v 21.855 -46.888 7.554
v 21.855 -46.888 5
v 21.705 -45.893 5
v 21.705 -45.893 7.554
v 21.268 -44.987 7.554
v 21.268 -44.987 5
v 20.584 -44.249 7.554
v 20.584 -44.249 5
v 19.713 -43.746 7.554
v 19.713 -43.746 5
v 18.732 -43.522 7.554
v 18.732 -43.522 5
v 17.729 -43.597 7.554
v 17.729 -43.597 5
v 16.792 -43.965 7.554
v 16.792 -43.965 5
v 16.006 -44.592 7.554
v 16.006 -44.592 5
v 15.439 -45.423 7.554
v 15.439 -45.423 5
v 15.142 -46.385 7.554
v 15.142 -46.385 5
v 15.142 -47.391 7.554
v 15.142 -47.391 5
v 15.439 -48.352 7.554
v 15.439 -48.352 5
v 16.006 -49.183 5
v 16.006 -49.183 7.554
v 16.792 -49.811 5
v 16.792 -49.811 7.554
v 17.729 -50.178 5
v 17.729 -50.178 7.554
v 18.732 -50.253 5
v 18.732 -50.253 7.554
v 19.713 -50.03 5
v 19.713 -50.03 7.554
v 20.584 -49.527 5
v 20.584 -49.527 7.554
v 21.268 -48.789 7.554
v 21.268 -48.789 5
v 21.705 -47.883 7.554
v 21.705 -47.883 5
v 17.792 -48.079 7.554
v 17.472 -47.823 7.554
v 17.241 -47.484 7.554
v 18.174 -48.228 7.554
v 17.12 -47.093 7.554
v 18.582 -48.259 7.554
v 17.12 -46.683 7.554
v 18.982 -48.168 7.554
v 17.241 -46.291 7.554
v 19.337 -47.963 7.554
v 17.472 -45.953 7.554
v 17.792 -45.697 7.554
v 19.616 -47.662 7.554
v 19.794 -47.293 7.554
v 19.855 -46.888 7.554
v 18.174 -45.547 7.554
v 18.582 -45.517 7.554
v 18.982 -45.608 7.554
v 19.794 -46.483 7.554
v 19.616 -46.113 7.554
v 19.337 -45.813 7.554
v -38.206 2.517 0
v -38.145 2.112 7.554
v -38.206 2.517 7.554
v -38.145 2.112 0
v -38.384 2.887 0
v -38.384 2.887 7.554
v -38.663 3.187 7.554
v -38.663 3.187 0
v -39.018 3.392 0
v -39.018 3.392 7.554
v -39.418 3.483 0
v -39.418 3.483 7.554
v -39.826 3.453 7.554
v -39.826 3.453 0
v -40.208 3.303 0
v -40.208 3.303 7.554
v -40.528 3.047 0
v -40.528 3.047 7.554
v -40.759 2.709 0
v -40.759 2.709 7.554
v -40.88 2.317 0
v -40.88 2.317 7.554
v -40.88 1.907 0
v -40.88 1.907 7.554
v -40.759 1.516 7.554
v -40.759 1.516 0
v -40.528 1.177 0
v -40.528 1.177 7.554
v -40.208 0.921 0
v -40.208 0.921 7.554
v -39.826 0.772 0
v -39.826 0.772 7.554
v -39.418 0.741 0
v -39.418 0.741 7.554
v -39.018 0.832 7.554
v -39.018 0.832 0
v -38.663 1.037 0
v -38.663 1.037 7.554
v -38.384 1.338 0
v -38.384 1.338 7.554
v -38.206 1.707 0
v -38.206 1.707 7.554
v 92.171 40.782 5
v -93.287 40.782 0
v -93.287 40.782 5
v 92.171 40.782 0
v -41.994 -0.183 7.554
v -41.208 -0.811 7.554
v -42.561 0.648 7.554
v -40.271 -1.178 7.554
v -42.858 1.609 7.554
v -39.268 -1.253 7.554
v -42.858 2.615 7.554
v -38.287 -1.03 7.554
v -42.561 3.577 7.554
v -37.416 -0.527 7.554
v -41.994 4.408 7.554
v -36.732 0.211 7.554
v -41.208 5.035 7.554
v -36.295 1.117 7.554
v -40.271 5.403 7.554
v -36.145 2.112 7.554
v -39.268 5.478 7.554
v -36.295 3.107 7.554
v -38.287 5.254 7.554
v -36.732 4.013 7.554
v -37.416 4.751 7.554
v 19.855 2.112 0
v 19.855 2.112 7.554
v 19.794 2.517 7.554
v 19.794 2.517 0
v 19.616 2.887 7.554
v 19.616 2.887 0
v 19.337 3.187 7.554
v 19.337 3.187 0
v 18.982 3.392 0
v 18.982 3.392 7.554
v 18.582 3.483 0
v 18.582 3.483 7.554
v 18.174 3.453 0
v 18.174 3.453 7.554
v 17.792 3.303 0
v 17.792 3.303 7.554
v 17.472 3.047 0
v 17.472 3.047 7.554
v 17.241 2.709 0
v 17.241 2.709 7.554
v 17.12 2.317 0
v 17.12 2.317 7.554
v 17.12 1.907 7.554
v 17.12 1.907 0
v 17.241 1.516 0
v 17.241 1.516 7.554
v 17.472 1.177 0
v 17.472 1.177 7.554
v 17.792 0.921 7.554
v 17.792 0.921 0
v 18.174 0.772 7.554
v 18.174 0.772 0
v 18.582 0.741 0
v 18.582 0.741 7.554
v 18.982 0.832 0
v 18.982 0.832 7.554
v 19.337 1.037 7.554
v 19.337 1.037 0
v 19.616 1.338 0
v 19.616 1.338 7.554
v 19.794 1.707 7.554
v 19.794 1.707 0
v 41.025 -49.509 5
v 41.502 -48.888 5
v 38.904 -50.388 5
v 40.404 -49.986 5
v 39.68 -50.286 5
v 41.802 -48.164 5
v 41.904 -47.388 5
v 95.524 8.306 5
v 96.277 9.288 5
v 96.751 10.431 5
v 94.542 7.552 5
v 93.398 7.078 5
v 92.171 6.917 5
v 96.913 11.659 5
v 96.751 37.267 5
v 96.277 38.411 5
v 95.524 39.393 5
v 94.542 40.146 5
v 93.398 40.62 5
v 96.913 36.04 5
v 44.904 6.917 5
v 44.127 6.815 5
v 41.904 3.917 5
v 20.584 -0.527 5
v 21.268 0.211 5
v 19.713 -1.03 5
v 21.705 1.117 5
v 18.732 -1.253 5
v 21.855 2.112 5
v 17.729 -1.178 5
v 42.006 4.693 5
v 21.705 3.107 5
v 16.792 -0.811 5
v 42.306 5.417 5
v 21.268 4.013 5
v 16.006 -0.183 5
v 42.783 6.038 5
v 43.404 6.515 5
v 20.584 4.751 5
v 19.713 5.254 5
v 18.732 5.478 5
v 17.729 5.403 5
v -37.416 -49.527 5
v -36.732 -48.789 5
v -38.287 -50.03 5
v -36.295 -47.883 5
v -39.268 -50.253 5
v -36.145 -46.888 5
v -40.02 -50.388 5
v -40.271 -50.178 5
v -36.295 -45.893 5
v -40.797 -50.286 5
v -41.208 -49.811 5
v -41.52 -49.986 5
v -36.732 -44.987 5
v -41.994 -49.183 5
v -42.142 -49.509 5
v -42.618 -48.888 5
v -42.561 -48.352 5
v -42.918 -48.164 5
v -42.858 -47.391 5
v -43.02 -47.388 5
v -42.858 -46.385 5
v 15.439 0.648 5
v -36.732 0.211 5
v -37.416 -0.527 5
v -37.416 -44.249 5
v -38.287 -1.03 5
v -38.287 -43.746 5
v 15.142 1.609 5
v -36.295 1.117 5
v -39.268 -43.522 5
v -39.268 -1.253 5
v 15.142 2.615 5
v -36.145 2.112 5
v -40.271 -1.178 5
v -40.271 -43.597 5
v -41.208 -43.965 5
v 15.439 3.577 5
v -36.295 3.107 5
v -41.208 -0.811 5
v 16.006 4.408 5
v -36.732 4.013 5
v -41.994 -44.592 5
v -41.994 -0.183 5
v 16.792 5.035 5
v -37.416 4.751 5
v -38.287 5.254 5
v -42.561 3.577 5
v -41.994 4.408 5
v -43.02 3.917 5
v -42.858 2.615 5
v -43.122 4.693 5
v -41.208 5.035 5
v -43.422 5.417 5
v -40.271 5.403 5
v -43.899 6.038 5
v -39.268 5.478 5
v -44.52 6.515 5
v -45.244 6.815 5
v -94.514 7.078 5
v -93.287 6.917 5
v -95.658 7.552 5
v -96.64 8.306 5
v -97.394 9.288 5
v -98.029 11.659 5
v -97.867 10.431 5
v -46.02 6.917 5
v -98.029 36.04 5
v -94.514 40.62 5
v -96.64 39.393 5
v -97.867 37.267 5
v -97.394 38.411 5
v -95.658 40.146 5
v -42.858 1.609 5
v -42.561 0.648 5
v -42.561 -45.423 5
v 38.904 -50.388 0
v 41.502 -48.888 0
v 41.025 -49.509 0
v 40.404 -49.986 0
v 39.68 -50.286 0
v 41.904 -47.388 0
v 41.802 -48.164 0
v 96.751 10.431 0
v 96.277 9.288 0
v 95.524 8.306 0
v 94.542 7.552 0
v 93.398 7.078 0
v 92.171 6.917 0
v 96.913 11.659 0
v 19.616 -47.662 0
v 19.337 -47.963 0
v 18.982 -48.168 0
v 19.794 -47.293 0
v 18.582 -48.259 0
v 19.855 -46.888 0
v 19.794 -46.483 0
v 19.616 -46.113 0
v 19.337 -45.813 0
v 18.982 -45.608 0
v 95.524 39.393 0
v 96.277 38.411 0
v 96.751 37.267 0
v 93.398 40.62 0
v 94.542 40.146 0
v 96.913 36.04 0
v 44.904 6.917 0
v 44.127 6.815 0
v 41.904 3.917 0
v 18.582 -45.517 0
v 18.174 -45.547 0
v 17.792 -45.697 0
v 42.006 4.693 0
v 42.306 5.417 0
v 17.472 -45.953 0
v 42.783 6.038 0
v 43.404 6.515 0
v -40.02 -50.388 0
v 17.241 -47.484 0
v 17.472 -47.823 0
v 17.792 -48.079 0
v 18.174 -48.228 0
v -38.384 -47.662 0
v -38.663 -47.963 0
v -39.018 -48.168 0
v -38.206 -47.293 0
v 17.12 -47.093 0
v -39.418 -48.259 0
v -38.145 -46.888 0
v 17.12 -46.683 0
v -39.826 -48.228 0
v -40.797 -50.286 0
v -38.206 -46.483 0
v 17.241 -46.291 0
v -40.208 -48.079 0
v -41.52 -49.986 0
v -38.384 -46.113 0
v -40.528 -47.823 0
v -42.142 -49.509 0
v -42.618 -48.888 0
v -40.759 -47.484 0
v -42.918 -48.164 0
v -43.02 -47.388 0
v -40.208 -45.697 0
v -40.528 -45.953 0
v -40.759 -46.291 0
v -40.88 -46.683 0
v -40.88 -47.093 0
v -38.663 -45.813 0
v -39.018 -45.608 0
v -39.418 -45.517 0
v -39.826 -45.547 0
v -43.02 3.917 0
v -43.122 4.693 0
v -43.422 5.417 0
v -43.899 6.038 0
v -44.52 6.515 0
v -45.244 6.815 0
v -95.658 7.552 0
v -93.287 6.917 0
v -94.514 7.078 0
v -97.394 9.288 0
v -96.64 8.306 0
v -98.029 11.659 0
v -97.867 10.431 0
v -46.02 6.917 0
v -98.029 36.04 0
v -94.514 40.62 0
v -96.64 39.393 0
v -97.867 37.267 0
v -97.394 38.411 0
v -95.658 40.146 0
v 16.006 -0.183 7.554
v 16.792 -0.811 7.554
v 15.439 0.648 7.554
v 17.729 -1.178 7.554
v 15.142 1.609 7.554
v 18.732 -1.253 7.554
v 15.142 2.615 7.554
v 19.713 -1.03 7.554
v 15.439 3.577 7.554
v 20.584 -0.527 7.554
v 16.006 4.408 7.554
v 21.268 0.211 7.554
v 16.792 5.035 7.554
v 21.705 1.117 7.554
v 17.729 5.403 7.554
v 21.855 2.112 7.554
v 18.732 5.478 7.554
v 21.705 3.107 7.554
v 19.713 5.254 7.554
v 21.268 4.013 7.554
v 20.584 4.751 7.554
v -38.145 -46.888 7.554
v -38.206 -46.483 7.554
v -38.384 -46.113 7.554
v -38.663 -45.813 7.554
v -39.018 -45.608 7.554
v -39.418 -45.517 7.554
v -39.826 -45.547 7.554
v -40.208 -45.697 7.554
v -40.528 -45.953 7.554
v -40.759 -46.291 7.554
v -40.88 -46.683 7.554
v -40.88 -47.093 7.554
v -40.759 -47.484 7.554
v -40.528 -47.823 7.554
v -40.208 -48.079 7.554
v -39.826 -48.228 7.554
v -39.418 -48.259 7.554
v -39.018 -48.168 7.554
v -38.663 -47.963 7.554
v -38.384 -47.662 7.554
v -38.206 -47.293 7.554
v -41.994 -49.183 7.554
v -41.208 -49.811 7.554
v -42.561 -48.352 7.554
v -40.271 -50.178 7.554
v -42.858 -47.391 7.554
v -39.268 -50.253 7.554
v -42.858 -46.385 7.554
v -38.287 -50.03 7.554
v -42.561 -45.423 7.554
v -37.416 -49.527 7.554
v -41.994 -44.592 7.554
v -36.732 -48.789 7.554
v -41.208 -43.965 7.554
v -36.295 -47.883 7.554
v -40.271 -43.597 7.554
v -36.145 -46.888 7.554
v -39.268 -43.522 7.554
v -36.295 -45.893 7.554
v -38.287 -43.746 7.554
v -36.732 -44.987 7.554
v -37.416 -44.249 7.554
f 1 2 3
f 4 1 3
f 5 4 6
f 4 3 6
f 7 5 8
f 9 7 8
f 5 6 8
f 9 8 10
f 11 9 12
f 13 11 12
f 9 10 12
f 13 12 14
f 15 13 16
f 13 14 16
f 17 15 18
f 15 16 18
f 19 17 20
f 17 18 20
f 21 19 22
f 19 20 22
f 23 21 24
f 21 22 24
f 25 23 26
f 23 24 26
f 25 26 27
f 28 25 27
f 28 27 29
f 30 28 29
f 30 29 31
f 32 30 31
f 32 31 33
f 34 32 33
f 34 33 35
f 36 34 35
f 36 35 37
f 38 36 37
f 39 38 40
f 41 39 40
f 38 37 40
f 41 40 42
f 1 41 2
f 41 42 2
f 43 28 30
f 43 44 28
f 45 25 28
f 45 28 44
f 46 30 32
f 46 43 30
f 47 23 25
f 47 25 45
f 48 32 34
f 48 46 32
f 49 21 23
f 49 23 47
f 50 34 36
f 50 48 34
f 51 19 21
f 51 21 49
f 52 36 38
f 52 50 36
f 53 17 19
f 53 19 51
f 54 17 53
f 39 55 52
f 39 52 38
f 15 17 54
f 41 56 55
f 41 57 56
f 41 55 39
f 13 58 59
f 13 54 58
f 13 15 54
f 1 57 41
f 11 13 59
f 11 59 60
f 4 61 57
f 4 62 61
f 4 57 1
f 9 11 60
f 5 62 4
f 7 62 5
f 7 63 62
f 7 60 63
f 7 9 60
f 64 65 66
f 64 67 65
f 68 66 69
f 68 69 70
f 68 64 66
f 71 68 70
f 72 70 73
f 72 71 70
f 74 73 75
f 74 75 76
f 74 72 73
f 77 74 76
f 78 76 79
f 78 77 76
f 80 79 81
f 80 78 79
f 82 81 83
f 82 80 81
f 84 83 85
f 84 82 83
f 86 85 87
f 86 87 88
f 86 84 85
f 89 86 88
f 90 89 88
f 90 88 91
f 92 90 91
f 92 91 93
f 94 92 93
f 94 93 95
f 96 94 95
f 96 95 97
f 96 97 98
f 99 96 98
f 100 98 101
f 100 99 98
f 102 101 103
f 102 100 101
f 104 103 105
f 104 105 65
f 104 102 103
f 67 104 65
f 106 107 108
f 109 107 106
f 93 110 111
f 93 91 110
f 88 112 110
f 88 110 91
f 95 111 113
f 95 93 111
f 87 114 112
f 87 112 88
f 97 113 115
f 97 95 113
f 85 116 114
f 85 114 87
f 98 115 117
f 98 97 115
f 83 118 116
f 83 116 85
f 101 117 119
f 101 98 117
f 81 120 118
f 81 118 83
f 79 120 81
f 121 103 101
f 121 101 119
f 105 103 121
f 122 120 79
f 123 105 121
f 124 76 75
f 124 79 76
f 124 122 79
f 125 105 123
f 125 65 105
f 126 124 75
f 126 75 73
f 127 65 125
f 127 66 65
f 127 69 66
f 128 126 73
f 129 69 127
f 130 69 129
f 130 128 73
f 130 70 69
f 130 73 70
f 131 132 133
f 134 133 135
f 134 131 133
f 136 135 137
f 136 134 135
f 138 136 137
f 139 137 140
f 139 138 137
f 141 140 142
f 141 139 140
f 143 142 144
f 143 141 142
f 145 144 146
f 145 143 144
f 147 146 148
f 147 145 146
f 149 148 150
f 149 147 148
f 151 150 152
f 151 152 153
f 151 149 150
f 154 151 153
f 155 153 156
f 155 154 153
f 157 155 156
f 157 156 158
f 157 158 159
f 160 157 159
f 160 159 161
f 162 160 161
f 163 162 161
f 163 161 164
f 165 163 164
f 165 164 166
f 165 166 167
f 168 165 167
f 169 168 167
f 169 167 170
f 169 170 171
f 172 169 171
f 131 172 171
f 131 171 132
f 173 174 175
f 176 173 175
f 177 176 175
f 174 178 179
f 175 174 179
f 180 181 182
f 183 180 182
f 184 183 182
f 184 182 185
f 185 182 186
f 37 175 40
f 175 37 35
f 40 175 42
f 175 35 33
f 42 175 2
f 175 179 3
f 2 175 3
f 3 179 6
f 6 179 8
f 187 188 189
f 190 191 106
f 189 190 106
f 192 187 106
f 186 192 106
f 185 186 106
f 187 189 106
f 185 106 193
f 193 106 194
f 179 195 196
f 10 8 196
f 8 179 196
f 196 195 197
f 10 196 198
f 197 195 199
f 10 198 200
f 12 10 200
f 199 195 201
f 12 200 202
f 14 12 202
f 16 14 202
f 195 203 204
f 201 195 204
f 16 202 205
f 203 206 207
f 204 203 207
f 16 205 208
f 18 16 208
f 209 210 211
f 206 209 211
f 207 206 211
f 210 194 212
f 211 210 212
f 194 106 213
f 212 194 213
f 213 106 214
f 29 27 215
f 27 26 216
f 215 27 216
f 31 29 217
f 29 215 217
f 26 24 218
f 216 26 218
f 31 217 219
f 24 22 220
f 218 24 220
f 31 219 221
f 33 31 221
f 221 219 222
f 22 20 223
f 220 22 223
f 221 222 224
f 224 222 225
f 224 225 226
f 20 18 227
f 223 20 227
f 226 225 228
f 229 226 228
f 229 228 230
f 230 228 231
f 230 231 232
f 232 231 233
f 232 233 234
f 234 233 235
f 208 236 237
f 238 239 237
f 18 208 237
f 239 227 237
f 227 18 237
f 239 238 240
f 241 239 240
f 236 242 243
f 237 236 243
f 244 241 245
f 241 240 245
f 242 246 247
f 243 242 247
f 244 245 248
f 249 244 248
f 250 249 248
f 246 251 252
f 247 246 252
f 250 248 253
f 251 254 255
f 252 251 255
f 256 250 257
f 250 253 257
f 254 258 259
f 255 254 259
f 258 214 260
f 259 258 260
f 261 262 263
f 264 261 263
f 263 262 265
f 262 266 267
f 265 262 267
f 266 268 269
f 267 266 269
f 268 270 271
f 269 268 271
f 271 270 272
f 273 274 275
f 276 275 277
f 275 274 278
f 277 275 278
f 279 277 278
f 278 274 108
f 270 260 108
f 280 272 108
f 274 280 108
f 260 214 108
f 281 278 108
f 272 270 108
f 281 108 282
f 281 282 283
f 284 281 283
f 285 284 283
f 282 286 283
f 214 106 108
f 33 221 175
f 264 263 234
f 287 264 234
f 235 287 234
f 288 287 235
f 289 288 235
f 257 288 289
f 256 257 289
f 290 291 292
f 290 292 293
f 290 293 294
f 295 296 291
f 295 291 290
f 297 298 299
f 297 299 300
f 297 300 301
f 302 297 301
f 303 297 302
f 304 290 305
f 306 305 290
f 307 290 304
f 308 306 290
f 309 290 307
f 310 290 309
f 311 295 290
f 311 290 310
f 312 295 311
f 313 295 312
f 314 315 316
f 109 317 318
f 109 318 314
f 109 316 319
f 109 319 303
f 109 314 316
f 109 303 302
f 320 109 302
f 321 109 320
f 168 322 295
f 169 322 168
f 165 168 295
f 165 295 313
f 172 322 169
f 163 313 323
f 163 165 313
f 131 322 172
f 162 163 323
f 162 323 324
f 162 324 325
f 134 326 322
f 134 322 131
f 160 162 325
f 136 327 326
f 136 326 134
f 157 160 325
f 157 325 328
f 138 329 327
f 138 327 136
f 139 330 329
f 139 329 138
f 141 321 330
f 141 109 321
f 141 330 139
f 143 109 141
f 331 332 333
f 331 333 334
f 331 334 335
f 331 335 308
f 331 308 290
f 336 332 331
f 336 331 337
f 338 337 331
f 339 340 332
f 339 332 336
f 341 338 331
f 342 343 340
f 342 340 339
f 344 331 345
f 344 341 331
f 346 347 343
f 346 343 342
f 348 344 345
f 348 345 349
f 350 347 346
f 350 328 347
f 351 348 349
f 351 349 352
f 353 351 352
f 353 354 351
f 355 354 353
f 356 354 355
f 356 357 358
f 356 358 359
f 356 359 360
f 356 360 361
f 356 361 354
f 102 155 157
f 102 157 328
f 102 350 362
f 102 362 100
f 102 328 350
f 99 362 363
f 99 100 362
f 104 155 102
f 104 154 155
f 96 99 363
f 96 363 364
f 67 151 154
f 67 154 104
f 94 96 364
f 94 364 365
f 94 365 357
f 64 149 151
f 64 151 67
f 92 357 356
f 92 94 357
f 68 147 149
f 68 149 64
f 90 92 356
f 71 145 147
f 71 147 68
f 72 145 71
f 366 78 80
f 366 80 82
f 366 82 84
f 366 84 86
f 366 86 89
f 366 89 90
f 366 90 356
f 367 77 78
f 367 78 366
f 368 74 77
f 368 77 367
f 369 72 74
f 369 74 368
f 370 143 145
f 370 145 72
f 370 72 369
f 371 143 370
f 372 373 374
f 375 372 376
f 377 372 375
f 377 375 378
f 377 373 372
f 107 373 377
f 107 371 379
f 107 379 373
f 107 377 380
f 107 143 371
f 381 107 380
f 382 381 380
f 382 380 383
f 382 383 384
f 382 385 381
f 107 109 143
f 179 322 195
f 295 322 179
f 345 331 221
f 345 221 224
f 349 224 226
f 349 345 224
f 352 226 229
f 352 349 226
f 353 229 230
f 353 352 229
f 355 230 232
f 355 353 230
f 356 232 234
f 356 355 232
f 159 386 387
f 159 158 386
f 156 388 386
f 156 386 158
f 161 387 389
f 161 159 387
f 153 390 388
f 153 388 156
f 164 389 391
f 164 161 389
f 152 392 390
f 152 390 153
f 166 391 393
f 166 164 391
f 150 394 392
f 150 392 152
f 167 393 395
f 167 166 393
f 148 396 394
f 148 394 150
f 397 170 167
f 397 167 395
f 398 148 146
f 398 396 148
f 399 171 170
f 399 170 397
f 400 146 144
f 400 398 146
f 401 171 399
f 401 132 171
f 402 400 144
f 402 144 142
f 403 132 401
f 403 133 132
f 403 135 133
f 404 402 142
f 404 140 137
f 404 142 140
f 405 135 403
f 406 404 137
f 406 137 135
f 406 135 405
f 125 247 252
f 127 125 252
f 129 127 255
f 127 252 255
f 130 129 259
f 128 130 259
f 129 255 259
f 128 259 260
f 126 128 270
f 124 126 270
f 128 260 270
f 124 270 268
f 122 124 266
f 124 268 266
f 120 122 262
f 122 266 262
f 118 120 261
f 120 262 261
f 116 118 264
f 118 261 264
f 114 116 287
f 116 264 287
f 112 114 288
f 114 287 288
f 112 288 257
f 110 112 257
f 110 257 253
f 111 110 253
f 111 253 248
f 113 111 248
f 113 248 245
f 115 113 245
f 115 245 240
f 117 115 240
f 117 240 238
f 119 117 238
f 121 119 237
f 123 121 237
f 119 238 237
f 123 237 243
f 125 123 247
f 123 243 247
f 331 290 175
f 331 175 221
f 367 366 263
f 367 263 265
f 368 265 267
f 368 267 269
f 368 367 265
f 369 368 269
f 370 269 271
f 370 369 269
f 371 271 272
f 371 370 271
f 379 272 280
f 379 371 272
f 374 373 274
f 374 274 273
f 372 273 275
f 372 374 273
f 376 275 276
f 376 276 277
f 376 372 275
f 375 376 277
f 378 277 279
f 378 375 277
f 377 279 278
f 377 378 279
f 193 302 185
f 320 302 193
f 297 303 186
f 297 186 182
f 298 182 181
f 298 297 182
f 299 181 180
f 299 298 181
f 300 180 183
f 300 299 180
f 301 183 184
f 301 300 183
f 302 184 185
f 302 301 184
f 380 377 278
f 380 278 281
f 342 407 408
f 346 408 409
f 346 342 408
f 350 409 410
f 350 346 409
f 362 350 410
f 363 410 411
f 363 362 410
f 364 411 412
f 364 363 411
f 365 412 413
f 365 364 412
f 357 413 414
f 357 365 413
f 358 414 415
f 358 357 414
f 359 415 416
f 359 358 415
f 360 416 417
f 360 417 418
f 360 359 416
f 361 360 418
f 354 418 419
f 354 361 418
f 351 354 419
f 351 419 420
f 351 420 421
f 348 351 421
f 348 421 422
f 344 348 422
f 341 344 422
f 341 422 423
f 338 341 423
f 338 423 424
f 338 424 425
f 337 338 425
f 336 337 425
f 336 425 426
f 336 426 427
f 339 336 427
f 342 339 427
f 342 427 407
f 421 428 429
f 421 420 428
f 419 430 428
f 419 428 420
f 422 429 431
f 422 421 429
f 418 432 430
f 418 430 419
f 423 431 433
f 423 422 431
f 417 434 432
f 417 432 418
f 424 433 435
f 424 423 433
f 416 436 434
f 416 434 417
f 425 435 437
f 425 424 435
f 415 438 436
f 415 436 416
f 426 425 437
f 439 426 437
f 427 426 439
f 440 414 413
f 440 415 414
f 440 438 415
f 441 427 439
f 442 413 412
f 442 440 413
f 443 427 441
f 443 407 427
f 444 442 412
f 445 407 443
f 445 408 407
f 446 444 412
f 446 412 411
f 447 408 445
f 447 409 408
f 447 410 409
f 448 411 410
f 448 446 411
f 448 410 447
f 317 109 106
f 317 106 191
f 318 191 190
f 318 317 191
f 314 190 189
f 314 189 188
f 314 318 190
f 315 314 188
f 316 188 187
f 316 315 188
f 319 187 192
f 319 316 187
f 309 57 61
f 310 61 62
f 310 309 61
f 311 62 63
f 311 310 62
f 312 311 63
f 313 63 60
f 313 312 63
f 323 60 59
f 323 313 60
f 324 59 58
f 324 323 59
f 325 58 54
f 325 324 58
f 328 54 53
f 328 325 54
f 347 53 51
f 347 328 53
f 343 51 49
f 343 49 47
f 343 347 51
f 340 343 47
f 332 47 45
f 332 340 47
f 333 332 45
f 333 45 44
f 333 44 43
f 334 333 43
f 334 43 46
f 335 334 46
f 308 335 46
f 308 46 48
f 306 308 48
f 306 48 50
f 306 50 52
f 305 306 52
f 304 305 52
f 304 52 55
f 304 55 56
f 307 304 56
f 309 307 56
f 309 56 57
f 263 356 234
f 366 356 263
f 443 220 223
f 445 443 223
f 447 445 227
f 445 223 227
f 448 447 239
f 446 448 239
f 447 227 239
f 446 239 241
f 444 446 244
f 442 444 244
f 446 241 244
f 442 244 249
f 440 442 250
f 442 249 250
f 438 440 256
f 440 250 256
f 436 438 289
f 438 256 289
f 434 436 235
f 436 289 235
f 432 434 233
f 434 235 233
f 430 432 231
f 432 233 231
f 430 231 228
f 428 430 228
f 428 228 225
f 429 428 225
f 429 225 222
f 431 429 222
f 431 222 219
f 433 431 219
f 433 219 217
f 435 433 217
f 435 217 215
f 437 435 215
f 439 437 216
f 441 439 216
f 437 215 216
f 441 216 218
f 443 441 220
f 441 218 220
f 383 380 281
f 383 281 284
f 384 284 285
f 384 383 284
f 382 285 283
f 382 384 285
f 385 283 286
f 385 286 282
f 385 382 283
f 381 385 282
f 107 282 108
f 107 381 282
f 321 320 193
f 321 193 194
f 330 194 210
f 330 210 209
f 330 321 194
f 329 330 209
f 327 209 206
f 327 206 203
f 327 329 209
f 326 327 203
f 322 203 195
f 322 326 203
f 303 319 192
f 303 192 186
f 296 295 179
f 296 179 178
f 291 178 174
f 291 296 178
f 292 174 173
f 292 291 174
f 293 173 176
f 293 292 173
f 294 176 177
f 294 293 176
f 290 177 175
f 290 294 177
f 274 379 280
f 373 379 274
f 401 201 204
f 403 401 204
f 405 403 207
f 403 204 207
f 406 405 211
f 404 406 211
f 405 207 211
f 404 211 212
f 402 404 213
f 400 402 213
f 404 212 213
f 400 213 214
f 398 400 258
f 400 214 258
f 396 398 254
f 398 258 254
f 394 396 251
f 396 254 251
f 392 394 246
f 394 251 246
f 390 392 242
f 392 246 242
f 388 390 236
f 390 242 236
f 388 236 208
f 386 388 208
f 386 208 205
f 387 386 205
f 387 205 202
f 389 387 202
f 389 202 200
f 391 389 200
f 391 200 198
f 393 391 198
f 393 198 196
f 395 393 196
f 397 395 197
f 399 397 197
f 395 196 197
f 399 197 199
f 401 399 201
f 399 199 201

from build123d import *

# Parameters (mm, degrees)
GRUNDFORM_R                     = 1.375
AUFSATZ_LINEAR_AUSTRAGEN1_DEPTH = 5
SKIZZE2_R                       = 3.375
SKIZZE2_R_2                     = 1.375
AUFSATZ_LINEAR_AUSTRAGEN2_DEPTH = 2.554396


with BuildPart() as part:
    # Grundform → Aufsatz-Linear austragen1 (new body)
    with BuildSketch(Plane.XY):
        with BuildLine():
            Line((-93.287044917, 40.781629135), (92.170661923, 40.781629135))
            ThreePointArc((92.170661923, 40.781629135), (95.523773437, 39.39272487), (96.912677703, 36.039613355))
            Line((96.912677703, 36.039613355), (96.912677703, 11.658797868))
            ThreePointArc((96.912677703, 11.658797868), (95.523773437, 8.305686353), (92.170661923, 6.916782087))
            Line((92.170661923, 6.916782087), (44.903892176, 6.916782087))
            ThreePointArc((44.903892176, 6.916782087), (42.782571833, 6.038102431), (41.903892176, 3.916782087))
            Line((41.903892176, 3.916782087), (41.903892176, -47.387842431))
            ThreePointArc((41.903892176, -47.387842431), (41.02521252, -49.509162775), (38.903892176, -50.387842431))
            Line((38.903892176, -50.387842431), (-40.02027517, -50.387842431))
            ThreePointArc((-40.02027517, -50.387842431), (-42.141595514, -49.509162775), (-43.02027517, -47.387842431))
            Line((-43.02027517, -47.387842431), (-43.02027517, 3.916782087))
            ThreePointArc((-43.02027517, 3.916782087), (-43.898954827, 6.038102431), (-46.02027517, 6.916782087))
            Line((-46.02027517, 6.916782087), (-93.287044917, 6.916782087))
            ThreePointArc((-93.287044917, 6.916782087), (-96.640156431, 8.305686353), (-98.029060697, 11.658797868))
            Line((-98.029060697, 11.658797868), (-98.029060697, 36.039613355))
            ThreePointArc((-98.029060697, 36.039613355), (-96.640156431, 39.39272487), (-93.287044917, 40.781629135))
        make_face()
        with Locations((-39.52027517, 2.112157569)):
            Circle(GRUNDFORM_R, mode=Mode.SUBTRACT)
        with Locations((18.47972483, 2.112157569)):
            Circle(GRUNDFORM_R, mode=Mode.SUBTRACT)
        with Locations((18.47972483, -46.887842431)):
            Circle(GRUNDFORM_R, mode=Mode.SUBTRACT)
        with Locations((-39.52027517, -46.887842431)):
            Circle(GRUNDFORM_R, mode=Mode.SUBTRACT)
    extrude(amount=AUFSATZ_LINEAR_AUSTRAGEN1_DEPTH)

    # Skizze2 → Aufsatz-Linear austragen2 (add)
    with BuildSketch(Plane.XY.offset(5)):
        with Locations((-39.52027517, 2.112157569)):
            Circle(SKIZZE2_R)
        with Locations((-39.52027517, 2.112157569)):
            Circle(SKIZZE2_R_2, mode=Mode.SUBTRACT)
        with Locations((18.47972483, 2.112157569)):
            Circle(SKIZZE2_R)
        with Locations((18.47972483, 2.112157569)):
            Circle(SKIZZE2_R_2, mode=Mode.SUBTRACT)
        with Locations((18.47972483, -46.887842431)):
            Circle(SKIZZE2_R)
        with Locations((18.47972483, -46.887842431)):
            Circle(SKIZZE2_R_2, mode=Mode.SUBTRACT)
        with Locations((-39.52027517, -46.887842431)):
            Circle(SKIZZE2_R)
        with Locations((-39.52027517, -46.887842431)):
            Circle(SKIZZE2_R_2, mode=Mode.SUBTRACT)
    extrude(amount=AUFSATZ_LINEAR_AUSTRAGEN2_DEPTH)


solid = part.part
